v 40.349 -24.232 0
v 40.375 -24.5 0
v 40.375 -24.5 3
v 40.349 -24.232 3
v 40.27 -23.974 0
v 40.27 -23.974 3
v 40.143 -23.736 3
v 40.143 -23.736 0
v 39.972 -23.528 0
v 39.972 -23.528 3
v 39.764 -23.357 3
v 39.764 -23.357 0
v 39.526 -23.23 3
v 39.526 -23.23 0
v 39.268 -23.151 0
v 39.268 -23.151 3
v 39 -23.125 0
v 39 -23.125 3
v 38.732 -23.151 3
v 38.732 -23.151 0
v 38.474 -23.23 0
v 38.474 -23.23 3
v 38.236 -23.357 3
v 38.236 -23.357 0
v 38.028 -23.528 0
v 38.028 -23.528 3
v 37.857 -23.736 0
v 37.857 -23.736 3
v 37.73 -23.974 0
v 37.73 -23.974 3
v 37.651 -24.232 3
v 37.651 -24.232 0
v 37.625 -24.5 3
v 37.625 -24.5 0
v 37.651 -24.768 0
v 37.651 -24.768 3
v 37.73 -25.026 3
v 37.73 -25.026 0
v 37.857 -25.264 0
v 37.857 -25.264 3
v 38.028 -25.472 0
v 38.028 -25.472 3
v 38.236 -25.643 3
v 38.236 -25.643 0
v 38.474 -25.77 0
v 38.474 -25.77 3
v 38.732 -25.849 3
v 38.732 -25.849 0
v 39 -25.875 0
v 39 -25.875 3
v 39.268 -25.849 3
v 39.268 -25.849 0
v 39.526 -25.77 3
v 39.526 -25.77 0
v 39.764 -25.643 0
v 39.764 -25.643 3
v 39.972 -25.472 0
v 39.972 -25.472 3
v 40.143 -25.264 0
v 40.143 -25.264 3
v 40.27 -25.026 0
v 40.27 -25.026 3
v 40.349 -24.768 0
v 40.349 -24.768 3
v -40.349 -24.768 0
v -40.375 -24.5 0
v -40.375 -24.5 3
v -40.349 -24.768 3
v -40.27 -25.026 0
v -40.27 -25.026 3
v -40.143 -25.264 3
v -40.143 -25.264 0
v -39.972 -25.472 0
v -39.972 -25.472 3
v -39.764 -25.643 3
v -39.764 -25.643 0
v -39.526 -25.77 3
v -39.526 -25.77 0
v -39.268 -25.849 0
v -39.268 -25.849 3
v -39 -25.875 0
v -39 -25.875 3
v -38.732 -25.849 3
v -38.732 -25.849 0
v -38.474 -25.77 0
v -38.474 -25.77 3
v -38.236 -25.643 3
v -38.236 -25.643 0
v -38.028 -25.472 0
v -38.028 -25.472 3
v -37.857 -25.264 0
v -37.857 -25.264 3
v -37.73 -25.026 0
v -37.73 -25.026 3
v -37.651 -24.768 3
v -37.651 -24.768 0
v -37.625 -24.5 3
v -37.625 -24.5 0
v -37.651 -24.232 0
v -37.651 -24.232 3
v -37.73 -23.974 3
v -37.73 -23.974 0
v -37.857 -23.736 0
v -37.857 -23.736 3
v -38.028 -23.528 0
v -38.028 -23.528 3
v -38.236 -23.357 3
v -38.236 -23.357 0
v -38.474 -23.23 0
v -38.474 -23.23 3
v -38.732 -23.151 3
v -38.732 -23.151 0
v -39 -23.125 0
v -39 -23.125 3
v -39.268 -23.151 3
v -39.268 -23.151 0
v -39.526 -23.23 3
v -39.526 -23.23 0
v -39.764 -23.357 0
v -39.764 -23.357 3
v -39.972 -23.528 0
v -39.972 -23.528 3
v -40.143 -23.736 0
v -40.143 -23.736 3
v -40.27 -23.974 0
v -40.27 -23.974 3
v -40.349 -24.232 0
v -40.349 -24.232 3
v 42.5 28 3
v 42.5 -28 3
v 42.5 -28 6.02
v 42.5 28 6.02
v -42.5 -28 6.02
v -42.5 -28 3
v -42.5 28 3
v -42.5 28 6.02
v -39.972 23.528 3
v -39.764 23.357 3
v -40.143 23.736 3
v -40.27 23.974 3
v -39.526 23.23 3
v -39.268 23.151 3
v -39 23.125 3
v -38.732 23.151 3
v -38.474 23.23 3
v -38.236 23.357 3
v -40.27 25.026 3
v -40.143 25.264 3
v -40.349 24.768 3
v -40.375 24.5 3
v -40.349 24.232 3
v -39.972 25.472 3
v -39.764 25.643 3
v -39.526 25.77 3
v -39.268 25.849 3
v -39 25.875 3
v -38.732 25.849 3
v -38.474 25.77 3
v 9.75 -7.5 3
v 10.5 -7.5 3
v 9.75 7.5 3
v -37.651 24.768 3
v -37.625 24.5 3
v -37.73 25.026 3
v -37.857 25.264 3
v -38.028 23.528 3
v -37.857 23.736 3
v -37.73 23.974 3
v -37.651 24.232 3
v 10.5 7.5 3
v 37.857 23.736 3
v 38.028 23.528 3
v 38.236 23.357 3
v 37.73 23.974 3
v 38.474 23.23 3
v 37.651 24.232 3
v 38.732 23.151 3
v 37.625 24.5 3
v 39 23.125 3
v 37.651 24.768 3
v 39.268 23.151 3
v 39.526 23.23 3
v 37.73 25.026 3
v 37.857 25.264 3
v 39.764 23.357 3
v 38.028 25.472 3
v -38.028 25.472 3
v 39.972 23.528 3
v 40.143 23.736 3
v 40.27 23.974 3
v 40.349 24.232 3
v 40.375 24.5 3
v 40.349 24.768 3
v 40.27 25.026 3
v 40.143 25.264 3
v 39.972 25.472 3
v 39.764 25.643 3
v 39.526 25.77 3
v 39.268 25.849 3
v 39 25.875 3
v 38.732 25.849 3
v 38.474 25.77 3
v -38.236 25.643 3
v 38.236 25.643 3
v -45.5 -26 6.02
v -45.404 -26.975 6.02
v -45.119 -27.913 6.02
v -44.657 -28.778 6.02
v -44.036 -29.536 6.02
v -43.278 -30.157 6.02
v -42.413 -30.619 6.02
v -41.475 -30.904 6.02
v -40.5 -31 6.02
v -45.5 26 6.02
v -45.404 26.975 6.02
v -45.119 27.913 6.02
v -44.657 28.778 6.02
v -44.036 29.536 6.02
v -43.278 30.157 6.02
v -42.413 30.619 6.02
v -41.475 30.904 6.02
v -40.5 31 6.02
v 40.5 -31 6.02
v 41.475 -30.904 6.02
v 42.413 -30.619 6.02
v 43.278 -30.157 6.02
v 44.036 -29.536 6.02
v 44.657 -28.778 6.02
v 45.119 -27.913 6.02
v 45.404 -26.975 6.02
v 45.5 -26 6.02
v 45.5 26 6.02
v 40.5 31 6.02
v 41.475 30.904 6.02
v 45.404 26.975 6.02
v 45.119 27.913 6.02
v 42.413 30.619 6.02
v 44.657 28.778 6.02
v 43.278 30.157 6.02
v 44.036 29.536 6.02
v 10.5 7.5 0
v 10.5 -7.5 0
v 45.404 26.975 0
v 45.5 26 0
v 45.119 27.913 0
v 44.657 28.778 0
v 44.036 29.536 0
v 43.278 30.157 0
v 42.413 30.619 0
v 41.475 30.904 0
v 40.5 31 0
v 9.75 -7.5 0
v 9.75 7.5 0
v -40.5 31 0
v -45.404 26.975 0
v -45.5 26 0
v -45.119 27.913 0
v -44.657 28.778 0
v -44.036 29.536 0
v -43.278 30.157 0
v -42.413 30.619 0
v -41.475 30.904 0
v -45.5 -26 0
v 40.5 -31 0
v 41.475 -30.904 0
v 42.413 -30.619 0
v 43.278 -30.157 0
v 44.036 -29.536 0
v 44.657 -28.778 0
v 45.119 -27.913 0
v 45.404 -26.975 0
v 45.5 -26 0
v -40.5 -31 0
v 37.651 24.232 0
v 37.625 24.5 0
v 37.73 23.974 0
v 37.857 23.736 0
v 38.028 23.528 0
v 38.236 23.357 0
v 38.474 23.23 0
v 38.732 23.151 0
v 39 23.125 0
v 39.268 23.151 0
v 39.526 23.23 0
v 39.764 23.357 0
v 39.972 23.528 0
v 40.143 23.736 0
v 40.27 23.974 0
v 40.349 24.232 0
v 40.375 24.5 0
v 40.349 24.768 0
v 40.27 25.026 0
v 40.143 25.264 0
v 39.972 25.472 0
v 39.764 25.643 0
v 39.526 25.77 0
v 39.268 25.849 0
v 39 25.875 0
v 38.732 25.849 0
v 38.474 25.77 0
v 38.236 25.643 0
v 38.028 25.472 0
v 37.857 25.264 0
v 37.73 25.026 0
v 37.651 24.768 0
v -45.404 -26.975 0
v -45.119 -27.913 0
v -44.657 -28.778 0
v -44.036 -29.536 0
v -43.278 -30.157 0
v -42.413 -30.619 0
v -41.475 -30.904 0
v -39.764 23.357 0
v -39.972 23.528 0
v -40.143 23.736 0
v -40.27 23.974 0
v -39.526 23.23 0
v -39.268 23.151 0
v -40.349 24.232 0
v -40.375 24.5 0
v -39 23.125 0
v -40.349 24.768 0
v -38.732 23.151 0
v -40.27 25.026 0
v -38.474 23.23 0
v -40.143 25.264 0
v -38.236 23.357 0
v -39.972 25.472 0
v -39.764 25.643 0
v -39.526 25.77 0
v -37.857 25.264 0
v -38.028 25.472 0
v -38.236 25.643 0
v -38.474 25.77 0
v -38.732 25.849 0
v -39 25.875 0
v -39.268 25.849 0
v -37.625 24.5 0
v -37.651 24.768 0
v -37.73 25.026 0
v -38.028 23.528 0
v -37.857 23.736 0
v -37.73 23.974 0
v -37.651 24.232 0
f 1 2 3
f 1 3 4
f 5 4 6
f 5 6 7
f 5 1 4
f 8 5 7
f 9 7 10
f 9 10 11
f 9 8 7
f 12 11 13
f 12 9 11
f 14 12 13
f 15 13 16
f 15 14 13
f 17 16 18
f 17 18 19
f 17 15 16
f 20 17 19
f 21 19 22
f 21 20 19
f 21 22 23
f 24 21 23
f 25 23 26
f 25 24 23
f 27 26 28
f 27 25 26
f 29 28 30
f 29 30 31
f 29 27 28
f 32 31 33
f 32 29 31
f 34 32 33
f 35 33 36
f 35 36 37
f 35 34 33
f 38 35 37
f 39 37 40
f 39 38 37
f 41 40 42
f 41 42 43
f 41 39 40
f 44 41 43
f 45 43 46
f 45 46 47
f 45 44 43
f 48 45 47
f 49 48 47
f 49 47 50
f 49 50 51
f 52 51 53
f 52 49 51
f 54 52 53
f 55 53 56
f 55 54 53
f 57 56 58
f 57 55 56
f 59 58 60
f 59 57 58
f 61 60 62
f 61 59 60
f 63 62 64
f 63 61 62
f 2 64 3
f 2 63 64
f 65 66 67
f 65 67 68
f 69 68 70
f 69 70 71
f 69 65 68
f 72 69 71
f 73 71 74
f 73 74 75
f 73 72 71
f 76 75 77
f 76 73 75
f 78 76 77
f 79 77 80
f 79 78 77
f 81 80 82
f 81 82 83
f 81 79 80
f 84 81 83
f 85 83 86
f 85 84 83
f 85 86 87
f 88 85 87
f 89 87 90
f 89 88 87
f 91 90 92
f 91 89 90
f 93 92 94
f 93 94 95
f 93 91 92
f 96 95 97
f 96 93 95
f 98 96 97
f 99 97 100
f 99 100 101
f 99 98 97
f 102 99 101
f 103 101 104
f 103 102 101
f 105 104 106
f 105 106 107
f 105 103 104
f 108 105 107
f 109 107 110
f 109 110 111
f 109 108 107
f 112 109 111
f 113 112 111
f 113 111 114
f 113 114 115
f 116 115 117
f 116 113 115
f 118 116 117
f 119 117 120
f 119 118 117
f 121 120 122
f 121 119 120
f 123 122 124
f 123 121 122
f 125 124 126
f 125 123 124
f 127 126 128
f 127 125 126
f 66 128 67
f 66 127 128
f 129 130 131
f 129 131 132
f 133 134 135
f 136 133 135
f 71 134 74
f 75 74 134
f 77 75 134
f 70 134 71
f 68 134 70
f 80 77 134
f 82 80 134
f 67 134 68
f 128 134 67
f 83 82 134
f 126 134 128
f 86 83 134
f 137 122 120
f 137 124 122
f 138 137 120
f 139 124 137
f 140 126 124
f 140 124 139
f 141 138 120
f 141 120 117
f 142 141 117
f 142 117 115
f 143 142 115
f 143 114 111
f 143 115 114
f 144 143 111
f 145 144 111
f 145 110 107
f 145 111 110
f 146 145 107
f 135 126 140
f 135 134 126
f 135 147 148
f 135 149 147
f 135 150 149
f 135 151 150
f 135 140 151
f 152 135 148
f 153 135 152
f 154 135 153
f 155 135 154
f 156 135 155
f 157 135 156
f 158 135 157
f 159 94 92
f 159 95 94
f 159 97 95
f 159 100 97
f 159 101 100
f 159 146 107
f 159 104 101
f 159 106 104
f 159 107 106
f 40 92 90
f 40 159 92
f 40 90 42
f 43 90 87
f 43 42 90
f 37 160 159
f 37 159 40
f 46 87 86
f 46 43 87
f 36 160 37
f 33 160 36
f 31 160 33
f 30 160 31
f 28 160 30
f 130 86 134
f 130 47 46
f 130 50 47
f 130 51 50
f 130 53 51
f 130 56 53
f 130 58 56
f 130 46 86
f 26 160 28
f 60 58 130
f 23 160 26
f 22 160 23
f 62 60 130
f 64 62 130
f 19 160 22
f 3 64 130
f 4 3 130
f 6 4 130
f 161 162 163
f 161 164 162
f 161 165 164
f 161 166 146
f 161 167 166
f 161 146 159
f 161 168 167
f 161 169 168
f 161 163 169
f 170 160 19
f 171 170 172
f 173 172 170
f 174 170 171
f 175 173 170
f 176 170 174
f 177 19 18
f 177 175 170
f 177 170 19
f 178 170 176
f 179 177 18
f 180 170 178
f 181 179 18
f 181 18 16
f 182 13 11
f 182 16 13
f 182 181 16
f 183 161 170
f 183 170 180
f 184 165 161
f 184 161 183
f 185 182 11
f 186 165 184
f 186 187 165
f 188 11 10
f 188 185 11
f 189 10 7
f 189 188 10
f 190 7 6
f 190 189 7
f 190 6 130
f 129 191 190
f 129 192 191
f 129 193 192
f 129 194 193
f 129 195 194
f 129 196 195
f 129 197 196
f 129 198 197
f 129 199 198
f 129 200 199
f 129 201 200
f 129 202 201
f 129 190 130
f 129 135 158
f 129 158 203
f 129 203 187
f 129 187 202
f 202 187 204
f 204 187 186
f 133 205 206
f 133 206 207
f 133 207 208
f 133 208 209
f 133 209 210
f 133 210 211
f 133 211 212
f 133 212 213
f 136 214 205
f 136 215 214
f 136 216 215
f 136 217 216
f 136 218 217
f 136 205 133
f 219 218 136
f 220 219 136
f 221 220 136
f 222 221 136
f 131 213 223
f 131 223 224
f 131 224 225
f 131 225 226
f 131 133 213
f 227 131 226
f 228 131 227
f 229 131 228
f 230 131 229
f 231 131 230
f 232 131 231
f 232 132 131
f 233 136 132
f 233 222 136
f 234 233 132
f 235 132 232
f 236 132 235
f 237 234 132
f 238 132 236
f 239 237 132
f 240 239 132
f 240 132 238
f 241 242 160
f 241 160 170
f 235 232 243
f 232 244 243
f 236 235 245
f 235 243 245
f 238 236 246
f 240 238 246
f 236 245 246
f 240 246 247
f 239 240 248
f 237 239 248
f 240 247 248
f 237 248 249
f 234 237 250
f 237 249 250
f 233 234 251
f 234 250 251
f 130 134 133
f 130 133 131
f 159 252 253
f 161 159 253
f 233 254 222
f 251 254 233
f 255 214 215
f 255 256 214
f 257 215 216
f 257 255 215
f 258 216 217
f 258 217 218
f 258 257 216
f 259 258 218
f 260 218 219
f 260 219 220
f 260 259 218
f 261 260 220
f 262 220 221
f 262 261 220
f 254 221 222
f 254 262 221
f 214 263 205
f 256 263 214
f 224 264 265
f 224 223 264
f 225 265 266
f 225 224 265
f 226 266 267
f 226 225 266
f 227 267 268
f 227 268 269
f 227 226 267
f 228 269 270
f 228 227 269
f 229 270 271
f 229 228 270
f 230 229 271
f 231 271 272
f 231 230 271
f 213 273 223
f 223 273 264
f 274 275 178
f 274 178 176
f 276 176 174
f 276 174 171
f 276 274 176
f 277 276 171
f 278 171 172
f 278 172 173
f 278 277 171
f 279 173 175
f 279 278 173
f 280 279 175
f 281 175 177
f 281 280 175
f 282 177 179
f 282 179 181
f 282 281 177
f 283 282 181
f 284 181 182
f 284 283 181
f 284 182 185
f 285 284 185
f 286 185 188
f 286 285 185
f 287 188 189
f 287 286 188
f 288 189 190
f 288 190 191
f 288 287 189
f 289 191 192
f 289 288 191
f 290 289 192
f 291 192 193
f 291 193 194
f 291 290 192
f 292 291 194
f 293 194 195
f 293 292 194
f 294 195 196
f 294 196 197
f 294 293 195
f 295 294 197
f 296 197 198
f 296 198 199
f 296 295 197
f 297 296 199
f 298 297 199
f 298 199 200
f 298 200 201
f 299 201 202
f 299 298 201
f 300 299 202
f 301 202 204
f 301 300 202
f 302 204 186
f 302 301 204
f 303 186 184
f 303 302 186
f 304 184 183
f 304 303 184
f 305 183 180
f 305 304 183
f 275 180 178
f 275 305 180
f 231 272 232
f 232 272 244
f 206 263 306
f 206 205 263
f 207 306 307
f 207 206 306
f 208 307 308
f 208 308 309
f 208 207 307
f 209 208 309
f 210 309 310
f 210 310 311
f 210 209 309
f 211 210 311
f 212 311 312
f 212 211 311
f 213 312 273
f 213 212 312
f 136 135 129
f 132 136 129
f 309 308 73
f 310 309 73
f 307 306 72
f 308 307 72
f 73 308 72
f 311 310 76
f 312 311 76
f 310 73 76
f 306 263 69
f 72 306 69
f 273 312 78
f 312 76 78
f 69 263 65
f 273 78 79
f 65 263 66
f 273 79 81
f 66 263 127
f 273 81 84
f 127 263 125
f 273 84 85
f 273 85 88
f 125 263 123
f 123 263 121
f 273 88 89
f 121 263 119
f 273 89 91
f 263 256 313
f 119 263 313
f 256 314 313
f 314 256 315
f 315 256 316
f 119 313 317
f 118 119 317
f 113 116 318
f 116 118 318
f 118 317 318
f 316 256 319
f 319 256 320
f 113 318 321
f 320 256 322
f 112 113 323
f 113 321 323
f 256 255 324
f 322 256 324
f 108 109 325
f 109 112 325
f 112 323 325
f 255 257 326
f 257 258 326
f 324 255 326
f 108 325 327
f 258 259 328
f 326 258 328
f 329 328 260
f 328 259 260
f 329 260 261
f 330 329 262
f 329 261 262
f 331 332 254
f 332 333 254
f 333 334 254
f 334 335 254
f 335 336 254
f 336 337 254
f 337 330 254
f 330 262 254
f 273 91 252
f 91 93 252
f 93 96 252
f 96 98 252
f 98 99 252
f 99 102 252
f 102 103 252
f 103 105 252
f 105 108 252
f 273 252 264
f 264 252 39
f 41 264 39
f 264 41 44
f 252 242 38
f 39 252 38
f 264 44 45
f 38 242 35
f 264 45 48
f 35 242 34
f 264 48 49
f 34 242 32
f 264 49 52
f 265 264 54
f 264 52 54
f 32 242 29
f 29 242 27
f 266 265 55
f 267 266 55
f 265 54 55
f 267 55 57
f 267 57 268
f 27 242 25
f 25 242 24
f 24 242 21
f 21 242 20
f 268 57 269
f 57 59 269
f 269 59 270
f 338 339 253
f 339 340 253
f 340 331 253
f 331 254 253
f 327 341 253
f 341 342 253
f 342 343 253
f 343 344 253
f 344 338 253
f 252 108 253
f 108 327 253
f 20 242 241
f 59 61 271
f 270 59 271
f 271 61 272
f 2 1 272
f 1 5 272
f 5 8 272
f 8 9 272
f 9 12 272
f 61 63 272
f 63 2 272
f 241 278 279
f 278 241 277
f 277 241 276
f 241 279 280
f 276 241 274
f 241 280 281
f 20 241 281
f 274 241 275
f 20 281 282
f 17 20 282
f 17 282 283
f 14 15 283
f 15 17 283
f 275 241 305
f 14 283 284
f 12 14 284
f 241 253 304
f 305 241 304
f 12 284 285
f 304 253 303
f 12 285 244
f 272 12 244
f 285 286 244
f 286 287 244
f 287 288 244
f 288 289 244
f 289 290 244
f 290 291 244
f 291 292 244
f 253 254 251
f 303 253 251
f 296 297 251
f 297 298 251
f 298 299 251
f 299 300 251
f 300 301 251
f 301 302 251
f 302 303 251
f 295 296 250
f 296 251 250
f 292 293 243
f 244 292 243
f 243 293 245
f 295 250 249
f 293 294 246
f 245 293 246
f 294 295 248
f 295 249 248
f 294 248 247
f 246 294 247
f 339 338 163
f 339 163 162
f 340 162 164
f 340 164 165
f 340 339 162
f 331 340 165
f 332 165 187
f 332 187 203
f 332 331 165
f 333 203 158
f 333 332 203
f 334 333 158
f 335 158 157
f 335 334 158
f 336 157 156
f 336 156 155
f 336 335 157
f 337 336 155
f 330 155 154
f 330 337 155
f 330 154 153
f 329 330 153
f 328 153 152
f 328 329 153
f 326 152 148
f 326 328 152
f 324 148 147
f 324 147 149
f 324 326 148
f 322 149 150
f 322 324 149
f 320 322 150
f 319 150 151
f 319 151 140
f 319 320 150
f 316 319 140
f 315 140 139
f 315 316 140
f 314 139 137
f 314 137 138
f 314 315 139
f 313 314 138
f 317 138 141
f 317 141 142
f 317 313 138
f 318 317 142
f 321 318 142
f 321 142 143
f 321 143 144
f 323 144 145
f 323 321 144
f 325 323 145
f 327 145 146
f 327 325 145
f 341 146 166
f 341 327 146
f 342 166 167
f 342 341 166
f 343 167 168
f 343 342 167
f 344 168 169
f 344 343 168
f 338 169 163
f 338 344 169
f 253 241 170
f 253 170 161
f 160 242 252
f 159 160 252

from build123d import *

# Parameters (mm, degrees)
SKETCH1_W           = 91
SKETCH1_H           = 62
SKETCH1_R           = 1.375
BOSS_EXTRUDE1_DEPTH = 3
SKETCH2_W           = 91
SKETCH2_H           = 62
SKETCH2_W_2         = 85
SKETCH2_H_2         = 56
BOSS_EXTRUDE2_DEPTH = 3.02
FILLET1_R           = 5
SKETCH3_W           = 0.75
SKETCH3_H           = 15
CUT_EXTRUDE1_DEPTH  = 3


with BuildPart() as part:
    # Sketch1 → Boss-Extrude1 (new body)
    with BuildSketch(Plane.XY):
        Rectangle(SKETCH1_W, SKETCH1_H)
        with Locations((-39, 24.5)):
            Circle(SKETCH1_R, mode=Mode.SUBTRACT)
        with Locations(Location((-39, -24.5, 0), (0, 0, 180))):
            Circle(SKETCH1_R, mode=Mode.SUBTRACT)
        with Locations((39, -24.5)):
            Circle(SKETCH1_R, mode=Mode.SUBTRACT)
        with Locations(Location((39, 24.5, 0), (0, 0, 180))):
            Circle(SKETCH1_R, mode=Mode.SUBTRACT)
    extrude(amount=BOSS_EXTRUDE1_DEPTH)

    # Sketch2 → Boss-Extrude2 (add)
    with BuildSketch(Plane.XY.offset(3)):
        Rectangle(SKETCH2_W, SKETCH2_H)
        Rectangle(SKETCH2_W_2, SKETCH2_H_2, mode=Mode.SUBTRACT)
    extrude(amount=BOSS_EXTRUDE2_DEPTH)

    # Fillet1
    fillet1_edges = [part.edges().sort_by_distance(p)[0] for p in [
        (45.5, -31, 3.01),
        (-45.5, -31, 3.01),
        (-45.5, 31, 3.01),
        (45.5, 31, 3.01),
    ]]
    fillet(fillet1_edges, radius=FILLET1_R)

    # Sketch3 → Cut-Extrude1 (cut)
    with BuildSketch(Plane(origin=(0, 0, 0), x_dir=(-1, 0, 0), z_dir=(0, 0, -1))):
        with Locations((-10.125, 0)):
            Rectangle(SKETCH3_W, SKETCH3_H)
    extrude(amount=-CUT_EXTRUDE1_DEPTH, mode=Mode.SUBTRACT)


solid = part.part
